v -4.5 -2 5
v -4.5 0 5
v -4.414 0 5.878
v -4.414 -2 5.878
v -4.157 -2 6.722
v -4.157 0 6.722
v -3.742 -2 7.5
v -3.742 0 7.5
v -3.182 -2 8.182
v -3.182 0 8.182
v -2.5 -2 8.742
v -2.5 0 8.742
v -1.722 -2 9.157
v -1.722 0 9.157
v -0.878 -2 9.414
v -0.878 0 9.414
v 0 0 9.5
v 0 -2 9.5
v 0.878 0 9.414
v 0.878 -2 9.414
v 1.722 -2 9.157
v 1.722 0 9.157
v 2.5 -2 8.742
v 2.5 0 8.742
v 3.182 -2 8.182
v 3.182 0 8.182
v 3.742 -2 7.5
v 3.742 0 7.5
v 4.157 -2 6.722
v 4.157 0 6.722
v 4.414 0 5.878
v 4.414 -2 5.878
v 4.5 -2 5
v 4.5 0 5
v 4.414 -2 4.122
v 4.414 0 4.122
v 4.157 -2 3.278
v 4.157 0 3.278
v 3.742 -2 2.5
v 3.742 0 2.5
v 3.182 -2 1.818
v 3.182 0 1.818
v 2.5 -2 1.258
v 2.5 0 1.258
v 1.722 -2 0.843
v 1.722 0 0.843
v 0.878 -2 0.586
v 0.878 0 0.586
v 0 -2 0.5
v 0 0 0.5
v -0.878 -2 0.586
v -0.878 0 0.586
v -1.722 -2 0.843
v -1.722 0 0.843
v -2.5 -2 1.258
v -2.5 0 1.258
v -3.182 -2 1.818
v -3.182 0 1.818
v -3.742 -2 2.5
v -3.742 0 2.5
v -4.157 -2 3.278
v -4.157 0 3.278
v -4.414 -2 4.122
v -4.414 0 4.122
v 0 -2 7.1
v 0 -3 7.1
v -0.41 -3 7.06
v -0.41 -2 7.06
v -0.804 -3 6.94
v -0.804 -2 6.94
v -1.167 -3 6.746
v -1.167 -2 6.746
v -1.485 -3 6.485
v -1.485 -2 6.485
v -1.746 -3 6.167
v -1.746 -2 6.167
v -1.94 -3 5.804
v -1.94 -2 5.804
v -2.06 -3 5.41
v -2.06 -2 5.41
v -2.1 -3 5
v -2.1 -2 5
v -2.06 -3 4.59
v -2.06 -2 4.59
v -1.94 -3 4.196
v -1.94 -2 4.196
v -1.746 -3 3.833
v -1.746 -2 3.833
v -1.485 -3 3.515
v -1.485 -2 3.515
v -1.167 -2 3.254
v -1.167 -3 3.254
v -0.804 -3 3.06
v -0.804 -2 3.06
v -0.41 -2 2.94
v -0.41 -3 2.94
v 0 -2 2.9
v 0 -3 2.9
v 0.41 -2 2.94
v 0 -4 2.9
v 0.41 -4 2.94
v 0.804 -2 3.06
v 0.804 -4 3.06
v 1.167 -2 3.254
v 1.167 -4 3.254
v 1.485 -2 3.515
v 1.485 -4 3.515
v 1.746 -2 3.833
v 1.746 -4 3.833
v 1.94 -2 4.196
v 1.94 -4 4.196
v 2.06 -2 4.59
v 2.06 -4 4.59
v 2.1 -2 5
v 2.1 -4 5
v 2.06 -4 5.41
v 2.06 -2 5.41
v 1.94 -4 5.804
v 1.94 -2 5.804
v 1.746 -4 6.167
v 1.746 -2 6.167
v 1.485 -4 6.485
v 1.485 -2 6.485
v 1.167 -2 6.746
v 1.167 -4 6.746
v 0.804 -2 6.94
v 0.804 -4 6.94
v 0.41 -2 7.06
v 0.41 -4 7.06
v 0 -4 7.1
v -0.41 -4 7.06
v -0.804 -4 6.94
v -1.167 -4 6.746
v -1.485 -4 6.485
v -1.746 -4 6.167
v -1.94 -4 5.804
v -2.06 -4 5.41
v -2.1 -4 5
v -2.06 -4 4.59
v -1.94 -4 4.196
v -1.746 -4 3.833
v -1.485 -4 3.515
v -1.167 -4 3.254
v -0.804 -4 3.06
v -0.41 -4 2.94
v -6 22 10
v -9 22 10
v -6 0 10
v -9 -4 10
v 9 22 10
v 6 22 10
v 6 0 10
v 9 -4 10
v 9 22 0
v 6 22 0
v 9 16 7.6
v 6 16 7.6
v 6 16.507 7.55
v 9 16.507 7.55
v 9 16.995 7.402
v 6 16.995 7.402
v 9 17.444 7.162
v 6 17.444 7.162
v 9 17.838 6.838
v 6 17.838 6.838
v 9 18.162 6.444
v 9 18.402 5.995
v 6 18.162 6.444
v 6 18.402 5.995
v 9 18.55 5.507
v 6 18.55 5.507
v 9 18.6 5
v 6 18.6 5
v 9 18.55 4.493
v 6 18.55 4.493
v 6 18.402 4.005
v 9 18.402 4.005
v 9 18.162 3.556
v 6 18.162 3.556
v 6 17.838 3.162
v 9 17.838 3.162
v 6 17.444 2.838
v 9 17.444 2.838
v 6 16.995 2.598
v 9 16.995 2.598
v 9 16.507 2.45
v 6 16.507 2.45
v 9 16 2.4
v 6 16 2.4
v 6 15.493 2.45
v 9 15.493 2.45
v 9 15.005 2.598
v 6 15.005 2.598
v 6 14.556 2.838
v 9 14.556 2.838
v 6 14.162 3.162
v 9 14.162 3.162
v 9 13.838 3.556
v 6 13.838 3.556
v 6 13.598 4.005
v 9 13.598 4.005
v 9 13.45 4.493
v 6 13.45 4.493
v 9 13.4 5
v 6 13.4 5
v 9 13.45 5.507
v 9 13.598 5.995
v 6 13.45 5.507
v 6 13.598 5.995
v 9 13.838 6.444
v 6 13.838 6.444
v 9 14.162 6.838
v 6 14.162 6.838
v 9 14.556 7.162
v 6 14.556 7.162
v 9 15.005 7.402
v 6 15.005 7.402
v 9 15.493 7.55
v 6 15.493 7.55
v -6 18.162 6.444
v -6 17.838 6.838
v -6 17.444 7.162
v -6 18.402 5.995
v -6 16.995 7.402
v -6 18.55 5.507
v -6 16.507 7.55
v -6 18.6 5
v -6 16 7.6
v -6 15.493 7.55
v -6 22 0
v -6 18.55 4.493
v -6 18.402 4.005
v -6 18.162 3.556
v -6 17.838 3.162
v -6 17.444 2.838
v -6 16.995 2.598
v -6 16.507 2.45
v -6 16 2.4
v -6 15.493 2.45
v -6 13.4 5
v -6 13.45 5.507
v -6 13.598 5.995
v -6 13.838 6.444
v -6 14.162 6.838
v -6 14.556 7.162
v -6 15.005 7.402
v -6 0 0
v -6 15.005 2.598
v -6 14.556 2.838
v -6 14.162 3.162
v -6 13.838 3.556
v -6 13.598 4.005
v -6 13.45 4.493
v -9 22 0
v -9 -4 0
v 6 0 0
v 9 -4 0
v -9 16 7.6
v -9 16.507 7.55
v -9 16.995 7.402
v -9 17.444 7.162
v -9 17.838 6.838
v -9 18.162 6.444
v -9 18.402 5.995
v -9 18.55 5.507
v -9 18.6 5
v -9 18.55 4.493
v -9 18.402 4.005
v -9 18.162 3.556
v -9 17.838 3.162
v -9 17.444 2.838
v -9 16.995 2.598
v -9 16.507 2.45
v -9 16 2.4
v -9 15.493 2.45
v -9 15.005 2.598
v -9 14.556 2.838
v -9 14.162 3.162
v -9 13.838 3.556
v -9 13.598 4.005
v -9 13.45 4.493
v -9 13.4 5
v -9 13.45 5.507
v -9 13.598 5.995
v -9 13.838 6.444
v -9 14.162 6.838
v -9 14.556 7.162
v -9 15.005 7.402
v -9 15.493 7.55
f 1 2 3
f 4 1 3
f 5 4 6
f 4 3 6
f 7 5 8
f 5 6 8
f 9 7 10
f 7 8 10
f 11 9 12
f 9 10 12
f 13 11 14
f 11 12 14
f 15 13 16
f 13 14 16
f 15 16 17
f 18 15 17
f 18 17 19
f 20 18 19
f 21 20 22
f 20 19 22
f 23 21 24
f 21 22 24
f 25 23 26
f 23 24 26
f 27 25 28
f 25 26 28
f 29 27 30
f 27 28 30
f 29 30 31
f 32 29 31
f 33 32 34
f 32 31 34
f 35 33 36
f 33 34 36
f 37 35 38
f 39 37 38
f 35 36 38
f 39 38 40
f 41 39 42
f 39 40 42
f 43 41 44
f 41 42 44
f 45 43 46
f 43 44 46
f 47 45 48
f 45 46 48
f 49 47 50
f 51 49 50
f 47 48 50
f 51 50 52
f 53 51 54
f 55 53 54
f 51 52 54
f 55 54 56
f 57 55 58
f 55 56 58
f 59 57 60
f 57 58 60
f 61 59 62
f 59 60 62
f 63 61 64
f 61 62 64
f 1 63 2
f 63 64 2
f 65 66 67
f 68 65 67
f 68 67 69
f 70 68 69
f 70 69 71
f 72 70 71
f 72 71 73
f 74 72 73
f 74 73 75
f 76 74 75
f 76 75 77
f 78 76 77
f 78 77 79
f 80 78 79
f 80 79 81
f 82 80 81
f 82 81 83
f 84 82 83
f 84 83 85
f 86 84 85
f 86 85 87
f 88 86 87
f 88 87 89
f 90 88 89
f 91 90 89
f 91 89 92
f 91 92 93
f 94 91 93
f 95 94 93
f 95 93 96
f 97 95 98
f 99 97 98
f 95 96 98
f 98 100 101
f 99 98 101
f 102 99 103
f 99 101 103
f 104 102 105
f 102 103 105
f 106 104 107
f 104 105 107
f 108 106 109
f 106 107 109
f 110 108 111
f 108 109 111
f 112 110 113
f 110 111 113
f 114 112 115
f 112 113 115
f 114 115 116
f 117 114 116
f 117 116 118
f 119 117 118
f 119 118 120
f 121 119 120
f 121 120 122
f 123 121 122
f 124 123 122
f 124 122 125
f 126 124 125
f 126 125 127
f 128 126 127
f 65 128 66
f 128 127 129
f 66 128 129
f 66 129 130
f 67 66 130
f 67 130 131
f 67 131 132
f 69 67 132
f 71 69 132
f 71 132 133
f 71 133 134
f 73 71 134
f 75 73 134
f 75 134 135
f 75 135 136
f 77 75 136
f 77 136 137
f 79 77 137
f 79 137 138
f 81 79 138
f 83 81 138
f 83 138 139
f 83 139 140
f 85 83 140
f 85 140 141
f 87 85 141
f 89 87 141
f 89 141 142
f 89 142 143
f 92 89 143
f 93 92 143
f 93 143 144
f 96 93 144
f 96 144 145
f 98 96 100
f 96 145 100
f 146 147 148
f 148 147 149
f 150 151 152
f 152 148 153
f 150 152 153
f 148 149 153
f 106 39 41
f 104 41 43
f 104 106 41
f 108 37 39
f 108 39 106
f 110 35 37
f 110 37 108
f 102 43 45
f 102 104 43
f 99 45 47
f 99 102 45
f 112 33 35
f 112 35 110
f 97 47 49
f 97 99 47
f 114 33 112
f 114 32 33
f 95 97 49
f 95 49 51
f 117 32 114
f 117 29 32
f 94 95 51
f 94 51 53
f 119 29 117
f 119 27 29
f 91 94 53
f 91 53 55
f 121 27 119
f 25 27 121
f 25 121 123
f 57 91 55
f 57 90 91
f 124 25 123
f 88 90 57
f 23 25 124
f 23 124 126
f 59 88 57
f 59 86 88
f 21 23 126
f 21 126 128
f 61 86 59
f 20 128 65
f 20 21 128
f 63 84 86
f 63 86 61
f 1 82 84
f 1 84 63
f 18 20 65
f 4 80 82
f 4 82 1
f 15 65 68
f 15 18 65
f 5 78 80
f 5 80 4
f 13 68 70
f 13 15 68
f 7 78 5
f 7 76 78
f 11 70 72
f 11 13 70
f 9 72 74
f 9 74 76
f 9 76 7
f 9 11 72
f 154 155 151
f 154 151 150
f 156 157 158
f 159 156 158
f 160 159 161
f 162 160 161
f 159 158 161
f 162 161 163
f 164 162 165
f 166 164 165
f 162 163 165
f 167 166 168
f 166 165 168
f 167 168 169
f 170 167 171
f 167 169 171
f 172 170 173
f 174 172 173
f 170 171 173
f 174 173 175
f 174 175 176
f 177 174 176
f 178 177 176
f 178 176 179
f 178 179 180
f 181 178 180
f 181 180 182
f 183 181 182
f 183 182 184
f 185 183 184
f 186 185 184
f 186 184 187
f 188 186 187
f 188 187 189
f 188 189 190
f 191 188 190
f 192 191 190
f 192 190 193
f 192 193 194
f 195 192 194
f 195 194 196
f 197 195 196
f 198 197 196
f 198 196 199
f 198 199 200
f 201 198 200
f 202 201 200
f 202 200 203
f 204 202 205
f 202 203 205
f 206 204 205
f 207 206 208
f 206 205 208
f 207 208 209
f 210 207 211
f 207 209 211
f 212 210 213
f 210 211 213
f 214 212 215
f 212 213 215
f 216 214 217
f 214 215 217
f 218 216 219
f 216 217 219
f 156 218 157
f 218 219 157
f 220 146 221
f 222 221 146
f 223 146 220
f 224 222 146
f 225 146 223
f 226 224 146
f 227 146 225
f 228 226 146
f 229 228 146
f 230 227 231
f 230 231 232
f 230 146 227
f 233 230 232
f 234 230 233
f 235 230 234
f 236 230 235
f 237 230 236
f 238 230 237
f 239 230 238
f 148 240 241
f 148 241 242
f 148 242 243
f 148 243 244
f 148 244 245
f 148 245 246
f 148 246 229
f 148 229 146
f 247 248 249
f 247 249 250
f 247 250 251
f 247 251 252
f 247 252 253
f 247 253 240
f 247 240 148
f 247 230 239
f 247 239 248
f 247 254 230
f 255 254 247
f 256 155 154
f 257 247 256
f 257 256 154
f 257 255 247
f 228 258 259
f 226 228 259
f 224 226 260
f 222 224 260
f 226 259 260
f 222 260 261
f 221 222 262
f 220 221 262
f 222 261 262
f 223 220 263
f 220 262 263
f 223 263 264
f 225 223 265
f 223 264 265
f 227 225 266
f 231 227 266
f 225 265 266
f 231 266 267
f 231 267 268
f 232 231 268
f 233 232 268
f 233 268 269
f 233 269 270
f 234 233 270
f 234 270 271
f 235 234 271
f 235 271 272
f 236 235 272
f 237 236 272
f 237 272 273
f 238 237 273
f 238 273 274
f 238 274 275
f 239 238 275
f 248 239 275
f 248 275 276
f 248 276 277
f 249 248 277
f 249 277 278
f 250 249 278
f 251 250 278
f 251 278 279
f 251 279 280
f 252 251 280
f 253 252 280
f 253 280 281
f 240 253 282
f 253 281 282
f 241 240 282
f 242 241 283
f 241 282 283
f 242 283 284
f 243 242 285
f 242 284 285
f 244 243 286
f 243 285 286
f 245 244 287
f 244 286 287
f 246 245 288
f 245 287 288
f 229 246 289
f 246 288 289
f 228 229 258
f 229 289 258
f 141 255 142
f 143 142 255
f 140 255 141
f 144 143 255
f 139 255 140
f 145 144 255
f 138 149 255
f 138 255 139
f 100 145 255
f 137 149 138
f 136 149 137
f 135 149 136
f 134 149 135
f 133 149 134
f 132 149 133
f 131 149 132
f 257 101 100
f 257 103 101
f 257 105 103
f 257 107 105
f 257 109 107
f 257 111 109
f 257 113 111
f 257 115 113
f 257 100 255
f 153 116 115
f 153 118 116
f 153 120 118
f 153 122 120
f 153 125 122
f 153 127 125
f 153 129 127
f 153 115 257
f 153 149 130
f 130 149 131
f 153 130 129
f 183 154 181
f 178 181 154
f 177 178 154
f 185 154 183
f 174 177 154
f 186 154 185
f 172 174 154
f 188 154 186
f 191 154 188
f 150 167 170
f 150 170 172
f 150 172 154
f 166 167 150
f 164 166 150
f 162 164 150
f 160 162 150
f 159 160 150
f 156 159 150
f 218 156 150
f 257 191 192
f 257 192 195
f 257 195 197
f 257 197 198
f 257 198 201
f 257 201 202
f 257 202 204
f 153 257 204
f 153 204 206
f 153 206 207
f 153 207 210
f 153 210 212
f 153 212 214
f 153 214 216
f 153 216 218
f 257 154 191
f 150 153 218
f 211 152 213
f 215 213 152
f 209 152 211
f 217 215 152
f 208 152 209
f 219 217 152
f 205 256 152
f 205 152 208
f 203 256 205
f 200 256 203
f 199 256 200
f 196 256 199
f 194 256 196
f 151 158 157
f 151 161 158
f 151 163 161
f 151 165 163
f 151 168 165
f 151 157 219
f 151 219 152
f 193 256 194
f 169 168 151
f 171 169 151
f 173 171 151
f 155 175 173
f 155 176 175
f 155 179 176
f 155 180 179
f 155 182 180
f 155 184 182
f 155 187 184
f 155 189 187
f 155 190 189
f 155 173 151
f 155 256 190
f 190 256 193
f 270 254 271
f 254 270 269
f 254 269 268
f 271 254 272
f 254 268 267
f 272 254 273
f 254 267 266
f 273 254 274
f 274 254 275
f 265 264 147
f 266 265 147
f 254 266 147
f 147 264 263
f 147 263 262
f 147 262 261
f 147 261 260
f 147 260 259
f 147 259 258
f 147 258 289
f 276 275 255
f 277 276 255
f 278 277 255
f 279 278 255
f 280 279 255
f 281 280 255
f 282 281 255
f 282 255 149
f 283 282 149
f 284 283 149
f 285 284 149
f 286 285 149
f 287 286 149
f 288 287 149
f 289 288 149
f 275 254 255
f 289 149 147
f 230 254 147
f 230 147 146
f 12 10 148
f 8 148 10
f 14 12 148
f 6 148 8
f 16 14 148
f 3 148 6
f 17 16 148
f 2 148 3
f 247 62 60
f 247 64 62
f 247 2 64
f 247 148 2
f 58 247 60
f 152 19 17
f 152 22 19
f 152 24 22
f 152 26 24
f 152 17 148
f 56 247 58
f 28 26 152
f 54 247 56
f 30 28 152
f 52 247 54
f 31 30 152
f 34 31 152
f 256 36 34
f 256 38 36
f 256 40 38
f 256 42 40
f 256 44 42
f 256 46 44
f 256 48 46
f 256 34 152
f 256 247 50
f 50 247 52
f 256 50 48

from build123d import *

# Parameters (mm, degrees)
BOSS_EXTRUDE1_DEPTH = 10
SKETCH2_R           = 2.6
CUT_EXTRUDE4_DEPTH  = 25
CUT_EXTRUDE5_DEPTH  = 10
SKETCH6_R           = 4.5
CUT_EXTRUDE6_DEPTH  = 2
BOSS_EXTRUDE2_START = 1
SKETCH7_W           = 18
SKETCH7_H           = 10
SKETCH7_R           = 2.1
BOSS_EXTRUDE2_DEPTH = 1


with BuildPart() as part:
    # Sketch1 → Boss-Extrude1 (new body)
    with BuildSketch(Plane.XY):
        Polygon((-6, 0), (6, 0), (6, 22), (9, 22), (9, -3), (-9, -3), (-9, 22), (-6, 22), align=None)
    extrude(amount=BOSS_EXTRUDE1_DEPTH)

    # Sketch2 → Cut-Extrude4 (cut)
    with BuildSketch(Plane.ZY.offset(9)):
        with Locations((5, 16)):
            Circle(SKETCH2_R)
    extrude(amount=-CUT_EXTRUDE4_DEPTH, mode=Mode.SUBTRACT)

    # Sketch5 → Cut-Extrude5 (cut)
    with BuildSketch(Plane.XZ.offset(3)):
        with BuildLine():
            Line((2.1, 5), (0, 5))
            Line((0, 5), (-2.1, 5))
            ThreePointArc((-2.1, 5), (0, 2.9), (2.1, 5))
        make_face()
        with BuildLine():
            Line((0, 7.1), (0, 5))
            Line((0, 5), (2.1, 5))
            ThreePointArc((2.1, 5), (1.48492424, 6.48492424), (0, 7.1))
        make_face()
        with BuildLine():
            Line((-2.1, 5), (0, 5))
            Line((0, 5), (0, 7.1))
            ThreePointArc((0, 7.1), (-1.48492424, 6.48492424), (-2.1, 5))
        make_face()
    extrude(amount=-CUT_EXTRUDE5_DEPTH, mode=Mode.SUBTRACT)

    # Sketch6 → Cut-Extrude6 (cut)
    with BuildSketch(Plane(origin=(0, 0, 0), x_dir=(1, 0, 0), z_dir=(0, 1, 0))):
        with Locations(Location((0, -5, 0), (0, 0, 180))):
            Circle(SKETCH6_R)
    extrude(amount=-CUT_EXTRUDE6_DEPTH, mode=Mode.SUBTRACT)

    # Sketch7 → Boss-Extrude2 (add)
    with BuildSketch(Plane.XZ.offset(3).offset(BOSS_EXTRUDE2_START)):
        with Locations((0, 5)):
            Rectangle(SKETCH7_W, SKETCH7_H)
        with Locations(Location((0, 5, 0), (0, 0, 270))):
            Circle(SKETCH7_R, mode=Mode.SUBTRACT)
    extrude(amount=-BOSS_EXTRUDE2_DEPTH)


solid = part.part
